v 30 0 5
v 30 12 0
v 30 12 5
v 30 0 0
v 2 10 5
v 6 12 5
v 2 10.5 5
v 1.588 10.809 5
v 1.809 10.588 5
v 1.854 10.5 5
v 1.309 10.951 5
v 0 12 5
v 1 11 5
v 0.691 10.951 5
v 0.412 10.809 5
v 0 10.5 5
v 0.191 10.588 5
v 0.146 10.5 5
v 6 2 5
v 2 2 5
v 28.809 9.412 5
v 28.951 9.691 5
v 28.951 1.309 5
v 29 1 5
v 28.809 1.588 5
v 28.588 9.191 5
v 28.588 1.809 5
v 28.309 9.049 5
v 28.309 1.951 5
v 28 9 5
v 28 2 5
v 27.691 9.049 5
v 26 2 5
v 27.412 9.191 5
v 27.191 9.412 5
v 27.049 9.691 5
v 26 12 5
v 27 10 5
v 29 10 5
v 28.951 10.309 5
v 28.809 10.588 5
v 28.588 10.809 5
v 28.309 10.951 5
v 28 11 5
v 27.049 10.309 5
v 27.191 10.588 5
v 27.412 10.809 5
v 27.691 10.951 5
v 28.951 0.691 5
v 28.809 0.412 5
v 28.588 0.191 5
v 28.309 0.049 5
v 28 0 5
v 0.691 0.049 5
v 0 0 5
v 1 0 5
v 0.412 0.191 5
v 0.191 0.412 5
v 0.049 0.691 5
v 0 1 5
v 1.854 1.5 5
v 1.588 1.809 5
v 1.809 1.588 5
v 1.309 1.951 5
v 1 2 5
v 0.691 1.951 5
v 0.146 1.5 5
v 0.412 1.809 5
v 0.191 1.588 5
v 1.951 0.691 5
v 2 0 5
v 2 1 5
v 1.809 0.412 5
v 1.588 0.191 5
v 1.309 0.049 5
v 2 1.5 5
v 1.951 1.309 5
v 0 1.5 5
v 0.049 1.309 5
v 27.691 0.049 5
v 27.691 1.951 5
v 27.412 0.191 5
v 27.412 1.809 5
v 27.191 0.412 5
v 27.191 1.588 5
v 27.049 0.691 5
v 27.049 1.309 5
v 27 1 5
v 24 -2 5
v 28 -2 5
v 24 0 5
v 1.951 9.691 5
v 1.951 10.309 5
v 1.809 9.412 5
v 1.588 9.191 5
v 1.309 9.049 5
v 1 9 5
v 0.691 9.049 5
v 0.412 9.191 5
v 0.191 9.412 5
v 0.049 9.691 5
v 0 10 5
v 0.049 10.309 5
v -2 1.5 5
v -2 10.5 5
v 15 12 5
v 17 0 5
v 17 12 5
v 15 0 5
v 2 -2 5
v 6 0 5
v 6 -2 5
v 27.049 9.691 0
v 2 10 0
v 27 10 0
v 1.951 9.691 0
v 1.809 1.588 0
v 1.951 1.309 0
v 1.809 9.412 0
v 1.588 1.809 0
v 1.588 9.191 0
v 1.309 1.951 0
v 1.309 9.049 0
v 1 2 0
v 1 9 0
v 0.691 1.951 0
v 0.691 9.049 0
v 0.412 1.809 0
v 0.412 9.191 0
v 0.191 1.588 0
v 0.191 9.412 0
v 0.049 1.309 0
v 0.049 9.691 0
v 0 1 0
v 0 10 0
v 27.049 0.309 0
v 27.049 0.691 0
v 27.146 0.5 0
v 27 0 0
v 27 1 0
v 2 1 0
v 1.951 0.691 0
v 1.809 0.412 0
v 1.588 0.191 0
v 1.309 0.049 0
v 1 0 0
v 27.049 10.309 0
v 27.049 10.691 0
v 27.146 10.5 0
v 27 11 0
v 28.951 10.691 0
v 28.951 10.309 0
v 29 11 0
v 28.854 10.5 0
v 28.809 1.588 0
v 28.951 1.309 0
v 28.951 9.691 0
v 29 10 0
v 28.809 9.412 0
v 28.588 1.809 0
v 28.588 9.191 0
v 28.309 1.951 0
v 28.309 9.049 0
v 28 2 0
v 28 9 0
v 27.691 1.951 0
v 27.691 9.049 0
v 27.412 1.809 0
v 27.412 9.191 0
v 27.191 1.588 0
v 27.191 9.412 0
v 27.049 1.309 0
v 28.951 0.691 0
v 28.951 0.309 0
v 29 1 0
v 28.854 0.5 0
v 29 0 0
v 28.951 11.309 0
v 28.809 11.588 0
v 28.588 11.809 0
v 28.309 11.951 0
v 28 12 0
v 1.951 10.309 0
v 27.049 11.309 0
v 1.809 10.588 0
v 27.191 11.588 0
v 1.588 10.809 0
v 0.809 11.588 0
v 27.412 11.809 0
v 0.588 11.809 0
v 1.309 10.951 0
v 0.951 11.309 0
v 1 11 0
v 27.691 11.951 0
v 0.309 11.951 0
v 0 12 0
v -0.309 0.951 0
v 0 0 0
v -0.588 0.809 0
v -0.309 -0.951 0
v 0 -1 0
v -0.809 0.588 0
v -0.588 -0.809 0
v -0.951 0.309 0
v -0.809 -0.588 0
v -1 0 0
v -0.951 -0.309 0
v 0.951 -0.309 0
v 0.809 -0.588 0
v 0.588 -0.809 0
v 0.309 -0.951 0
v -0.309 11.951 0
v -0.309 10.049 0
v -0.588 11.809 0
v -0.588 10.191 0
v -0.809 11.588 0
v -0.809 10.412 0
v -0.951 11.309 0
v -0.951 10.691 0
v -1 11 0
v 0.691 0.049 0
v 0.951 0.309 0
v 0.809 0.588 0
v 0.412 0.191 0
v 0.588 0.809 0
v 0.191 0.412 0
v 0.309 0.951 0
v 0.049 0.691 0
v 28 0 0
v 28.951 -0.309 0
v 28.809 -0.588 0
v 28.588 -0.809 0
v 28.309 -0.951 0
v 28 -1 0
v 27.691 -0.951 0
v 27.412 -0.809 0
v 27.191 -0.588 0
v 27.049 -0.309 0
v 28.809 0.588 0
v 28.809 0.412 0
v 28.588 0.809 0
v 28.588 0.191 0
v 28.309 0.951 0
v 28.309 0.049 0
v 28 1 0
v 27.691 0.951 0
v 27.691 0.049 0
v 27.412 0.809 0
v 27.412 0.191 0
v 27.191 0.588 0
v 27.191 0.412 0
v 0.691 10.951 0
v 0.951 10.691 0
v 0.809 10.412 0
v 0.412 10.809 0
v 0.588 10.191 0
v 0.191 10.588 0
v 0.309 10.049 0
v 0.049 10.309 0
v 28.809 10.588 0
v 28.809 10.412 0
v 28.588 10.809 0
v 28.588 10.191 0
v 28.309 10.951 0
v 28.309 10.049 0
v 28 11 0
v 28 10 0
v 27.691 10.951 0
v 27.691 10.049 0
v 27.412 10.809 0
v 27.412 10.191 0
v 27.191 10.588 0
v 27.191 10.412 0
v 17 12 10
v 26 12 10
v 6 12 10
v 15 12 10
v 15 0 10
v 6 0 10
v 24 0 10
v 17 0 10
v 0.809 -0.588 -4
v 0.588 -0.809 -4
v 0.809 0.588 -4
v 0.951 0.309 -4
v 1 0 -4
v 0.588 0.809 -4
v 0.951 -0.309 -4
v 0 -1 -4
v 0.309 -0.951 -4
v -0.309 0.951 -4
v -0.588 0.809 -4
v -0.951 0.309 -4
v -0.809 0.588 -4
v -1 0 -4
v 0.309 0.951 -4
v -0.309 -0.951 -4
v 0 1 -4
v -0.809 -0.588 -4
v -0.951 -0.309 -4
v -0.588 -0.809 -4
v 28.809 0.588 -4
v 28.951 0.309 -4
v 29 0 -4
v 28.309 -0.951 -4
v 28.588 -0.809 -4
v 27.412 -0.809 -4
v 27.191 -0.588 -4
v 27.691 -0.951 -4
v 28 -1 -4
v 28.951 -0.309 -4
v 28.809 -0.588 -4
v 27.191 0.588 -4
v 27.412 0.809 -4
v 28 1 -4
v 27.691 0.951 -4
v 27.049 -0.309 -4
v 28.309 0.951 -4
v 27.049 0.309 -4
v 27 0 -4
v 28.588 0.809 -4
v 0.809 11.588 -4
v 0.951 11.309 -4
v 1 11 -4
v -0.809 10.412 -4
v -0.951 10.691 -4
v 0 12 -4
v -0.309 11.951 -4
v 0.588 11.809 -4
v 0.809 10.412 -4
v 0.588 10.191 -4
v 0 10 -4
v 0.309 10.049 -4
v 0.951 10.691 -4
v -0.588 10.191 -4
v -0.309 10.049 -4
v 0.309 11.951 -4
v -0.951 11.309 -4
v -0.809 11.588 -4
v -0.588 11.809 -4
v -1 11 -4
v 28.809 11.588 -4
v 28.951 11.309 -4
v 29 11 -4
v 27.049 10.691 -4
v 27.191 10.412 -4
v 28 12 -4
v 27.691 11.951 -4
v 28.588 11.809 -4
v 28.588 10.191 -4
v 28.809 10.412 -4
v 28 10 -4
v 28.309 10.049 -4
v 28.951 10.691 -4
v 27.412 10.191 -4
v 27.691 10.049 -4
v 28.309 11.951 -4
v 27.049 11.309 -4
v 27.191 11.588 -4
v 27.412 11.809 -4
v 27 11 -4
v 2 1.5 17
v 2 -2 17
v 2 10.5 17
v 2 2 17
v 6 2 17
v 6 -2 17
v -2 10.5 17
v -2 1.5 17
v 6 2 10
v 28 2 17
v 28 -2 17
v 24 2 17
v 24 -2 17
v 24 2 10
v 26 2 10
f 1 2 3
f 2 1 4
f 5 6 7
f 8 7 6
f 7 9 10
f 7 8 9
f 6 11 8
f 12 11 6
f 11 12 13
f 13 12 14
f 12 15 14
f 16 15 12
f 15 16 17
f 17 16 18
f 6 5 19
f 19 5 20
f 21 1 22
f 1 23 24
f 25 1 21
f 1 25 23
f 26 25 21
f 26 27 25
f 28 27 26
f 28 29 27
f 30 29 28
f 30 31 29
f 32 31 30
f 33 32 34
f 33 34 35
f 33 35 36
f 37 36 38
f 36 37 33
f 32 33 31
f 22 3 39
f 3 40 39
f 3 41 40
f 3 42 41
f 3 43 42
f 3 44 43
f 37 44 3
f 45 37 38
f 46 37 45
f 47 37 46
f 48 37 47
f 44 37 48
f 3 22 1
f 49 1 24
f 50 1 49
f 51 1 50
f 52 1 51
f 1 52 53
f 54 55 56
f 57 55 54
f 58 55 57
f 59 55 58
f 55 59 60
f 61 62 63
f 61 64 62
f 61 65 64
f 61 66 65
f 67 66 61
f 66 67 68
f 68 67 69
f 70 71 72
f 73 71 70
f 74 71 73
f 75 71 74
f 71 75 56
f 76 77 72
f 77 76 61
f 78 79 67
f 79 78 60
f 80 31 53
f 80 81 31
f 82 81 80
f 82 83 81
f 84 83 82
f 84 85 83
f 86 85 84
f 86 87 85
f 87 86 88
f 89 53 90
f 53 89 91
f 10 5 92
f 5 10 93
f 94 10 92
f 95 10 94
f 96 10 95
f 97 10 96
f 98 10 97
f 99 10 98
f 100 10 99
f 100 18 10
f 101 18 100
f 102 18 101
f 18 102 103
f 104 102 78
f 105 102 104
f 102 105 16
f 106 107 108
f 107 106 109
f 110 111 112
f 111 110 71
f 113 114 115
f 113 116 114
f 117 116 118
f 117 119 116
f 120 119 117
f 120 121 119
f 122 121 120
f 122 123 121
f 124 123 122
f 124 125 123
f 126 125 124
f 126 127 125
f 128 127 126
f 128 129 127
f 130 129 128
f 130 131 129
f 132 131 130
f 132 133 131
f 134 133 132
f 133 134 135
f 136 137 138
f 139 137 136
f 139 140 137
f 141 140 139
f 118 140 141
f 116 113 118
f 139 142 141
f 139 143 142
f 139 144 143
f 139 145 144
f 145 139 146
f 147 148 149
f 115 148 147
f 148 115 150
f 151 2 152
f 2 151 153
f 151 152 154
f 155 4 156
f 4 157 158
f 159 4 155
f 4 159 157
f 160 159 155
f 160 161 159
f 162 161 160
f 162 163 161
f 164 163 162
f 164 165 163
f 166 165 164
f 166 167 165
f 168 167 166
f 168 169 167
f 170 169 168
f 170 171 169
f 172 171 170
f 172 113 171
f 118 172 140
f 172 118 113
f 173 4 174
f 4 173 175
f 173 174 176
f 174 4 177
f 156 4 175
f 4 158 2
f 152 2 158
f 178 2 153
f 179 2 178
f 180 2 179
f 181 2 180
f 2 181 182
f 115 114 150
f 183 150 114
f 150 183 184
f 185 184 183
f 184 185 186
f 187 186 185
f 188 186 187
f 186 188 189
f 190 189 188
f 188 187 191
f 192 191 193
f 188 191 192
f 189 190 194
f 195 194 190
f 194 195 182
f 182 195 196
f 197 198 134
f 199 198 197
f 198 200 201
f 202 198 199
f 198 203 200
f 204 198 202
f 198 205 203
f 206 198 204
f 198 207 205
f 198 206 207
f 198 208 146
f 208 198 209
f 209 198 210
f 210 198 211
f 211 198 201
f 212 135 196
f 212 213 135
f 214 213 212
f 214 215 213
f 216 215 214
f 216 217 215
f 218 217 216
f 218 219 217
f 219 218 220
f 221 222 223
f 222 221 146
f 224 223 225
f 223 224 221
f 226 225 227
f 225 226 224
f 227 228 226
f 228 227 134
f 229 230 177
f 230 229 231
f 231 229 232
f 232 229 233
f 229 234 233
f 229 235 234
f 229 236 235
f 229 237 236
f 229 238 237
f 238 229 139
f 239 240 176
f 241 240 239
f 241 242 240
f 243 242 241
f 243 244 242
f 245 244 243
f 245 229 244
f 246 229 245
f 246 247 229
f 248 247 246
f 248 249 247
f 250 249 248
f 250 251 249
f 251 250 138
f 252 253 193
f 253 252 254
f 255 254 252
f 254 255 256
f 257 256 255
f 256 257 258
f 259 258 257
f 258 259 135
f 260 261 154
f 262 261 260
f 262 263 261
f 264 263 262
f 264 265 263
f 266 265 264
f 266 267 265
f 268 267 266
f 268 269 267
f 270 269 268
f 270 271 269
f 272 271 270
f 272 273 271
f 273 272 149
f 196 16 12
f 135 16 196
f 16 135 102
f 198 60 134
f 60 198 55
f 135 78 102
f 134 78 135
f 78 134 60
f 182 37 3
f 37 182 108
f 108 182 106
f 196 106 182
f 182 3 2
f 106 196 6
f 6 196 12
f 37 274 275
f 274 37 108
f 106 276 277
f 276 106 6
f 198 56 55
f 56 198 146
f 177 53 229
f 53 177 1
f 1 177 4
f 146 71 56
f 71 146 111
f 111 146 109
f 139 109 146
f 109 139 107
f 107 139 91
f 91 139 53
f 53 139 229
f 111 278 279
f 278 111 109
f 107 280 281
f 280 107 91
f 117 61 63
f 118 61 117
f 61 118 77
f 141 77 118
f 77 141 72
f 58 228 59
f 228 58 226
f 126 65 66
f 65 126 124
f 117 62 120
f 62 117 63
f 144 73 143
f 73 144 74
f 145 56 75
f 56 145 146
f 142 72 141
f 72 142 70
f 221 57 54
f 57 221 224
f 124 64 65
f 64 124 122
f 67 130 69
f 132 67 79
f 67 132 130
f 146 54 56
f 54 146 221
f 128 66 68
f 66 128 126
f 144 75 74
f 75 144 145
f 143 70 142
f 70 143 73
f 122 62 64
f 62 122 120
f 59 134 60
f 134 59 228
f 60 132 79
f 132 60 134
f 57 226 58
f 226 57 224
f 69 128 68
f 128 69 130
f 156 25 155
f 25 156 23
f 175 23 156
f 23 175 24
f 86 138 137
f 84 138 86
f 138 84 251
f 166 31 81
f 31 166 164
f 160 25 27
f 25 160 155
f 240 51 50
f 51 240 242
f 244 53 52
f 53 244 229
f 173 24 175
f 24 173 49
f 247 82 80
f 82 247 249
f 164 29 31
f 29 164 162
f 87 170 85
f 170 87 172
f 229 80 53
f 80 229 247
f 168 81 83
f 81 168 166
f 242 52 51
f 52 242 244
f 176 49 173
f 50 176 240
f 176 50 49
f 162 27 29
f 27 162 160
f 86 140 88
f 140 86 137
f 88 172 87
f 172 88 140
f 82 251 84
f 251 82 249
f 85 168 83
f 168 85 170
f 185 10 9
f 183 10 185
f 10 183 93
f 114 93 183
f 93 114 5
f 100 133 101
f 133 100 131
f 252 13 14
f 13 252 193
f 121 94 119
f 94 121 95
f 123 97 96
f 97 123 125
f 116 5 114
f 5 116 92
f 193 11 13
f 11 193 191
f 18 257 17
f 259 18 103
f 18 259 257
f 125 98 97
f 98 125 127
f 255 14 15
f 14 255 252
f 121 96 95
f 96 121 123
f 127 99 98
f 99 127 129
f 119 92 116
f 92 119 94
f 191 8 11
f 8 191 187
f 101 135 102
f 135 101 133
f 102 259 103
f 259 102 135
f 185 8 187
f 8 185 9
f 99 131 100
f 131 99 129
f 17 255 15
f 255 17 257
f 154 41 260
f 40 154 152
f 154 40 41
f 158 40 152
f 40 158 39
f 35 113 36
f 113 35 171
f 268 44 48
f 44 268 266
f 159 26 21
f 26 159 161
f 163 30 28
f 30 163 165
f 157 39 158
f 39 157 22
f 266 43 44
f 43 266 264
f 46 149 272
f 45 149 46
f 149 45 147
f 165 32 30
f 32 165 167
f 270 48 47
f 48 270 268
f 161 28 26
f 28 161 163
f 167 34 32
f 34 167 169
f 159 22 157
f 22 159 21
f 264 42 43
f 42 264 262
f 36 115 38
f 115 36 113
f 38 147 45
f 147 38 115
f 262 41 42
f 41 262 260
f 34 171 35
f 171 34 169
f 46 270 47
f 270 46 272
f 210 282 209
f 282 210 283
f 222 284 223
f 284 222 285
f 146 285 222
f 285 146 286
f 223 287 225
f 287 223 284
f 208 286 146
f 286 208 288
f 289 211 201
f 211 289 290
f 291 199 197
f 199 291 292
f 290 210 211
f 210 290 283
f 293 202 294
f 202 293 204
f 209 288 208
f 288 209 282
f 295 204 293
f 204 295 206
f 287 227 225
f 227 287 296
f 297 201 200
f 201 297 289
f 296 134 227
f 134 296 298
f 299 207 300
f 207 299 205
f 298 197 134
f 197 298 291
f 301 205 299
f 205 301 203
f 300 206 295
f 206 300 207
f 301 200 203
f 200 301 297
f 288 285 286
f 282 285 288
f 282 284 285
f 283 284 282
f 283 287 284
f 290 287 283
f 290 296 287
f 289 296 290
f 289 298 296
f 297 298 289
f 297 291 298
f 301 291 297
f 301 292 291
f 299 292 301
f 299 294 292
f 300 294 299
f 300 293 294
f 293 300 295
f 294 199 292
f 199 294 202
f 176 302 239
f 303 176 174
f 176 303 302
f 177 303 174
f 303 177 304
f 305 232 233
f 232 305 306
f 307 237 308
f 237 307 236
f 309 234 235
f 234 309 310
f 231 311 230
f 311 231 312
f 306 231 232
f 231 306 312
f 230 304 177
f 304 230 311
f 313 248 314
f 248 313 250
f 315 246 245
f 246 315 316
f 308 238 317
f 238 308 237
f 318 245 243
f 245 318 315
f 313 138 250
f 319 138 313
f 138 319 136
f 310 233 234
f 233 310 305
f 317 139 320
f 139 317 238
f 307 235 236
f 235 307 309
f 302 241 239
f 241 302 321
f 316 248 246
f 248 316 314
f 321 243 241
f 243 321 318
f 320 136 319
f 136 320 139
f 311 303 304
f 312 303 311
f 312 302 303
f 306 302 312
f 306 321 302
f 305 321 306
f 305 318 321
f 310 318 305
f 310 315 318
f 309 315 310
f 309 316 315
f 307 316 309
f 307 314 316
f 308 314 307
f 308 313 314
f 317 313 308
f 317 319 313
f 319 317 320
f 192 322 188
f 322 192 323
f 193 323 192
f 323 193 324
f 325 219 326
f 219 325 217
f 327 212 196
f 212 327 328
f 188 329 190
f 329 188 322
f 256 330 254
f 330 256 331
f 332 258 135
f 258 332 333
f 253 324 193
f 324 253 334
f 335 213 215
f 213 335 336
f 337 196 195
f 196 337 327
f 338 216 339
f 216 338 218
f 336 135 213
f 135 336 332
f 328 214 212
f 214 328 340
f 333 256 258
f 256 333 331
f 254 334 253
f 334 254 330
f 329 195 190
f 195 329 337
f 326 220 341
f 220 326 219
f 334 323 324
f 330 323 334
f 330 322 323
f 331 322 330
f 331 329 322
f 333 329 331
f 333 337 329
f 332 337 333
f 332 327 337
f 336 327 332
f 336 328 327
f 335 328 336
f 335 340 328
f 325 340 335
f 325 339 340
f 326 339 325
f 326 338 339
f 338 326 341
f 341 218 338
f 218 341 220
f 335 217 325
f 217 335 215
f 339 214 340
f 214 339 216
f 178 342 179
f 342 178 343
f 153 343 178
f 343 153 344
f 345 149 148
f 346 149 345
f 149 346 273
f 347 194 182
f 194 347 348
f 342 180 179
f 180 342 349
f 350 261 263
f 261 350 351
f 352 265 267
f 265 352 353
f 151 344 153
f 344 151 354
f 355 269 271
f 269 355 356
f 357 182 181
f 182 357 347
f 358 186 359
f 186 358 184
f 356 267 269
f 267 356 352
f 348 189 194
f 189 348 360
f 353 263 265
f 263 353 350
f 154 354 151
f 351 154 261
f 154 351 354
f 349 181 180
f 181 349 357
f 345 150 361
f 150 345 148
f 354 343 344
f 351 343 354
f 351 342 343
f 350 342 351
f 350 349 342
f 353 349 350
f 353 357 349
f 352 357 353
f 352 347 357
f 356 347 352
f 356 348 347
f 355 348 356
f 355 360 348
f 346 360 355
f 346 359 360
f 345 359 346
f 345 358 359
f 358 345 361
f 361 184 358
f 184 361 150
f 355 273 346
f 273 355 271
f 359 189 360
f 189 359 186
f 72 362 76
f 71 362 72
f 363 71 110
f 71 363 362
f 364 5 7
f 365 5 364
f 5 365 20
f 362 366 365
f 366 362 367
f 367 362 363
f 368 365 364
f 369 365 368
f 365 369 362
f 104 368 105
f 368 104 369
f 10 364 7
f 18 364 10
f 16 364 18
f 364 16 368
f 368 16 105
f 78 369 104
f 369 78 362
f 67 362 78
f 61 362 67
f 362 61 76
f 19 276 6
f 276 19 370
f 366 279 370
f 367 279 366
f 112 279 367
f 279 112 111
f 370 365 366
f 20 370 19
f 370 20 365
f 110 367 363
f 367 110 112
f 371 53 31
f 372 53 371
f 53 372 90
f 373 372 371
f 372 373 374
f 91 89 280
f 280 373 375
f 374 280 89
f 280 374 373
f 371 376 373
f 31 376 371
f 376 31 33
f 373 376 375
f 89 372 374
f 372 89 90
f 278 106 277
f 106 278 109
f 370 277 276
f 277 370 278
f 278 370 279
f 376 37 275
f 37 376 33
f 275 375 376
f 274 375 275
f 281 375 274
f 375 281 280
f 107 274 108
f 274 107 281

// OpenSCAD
module couch() {
    difference() {
        // Couch base
        cube([30, 12, 5]);

        // Legs holes
        translate([1, 1, -1]) cylinder(h = 6, r = 1, $fn = 20);
        translate([28, 1, -1]) cylinder(h = 6, r = 1, $fn = 20);
        translate([1, 10, -1]) cylinder(h = 6, r = 1, $fn = 20);
        translate([28, 10, -1]) cylinder(h = 6, r = 1, $fn = 20);
    }
    
    // Legs
    translate([0, 0, -4]) cylinder(h = 4, r = 1, $fn = 20);
    translate([28, 0, -4]) cylinder(h = 4, r = 1, $fn = 20);
    translate([0, 11, -4]) cylinder(h = 4, r = 1, $fn = 20);
    translate([28, 11, -4]) cylinder(h = 4, r = 1, $fn = 20);

    // Couch back
    translate([-2, 1.5, 5]) cube([4, 9, 12]);

    // Couch arms
    translate([2, -2, 5]) cube([4, 4, 12]);
    translate([24, -2, 5]) cube([4, 4, 12]);

    // Couch cushions
    translate([6, 0, 5]) cube([9, 12, 5]);
    translate([17, 0, 5]) cube([9, 12, 5]);
}

couch();
